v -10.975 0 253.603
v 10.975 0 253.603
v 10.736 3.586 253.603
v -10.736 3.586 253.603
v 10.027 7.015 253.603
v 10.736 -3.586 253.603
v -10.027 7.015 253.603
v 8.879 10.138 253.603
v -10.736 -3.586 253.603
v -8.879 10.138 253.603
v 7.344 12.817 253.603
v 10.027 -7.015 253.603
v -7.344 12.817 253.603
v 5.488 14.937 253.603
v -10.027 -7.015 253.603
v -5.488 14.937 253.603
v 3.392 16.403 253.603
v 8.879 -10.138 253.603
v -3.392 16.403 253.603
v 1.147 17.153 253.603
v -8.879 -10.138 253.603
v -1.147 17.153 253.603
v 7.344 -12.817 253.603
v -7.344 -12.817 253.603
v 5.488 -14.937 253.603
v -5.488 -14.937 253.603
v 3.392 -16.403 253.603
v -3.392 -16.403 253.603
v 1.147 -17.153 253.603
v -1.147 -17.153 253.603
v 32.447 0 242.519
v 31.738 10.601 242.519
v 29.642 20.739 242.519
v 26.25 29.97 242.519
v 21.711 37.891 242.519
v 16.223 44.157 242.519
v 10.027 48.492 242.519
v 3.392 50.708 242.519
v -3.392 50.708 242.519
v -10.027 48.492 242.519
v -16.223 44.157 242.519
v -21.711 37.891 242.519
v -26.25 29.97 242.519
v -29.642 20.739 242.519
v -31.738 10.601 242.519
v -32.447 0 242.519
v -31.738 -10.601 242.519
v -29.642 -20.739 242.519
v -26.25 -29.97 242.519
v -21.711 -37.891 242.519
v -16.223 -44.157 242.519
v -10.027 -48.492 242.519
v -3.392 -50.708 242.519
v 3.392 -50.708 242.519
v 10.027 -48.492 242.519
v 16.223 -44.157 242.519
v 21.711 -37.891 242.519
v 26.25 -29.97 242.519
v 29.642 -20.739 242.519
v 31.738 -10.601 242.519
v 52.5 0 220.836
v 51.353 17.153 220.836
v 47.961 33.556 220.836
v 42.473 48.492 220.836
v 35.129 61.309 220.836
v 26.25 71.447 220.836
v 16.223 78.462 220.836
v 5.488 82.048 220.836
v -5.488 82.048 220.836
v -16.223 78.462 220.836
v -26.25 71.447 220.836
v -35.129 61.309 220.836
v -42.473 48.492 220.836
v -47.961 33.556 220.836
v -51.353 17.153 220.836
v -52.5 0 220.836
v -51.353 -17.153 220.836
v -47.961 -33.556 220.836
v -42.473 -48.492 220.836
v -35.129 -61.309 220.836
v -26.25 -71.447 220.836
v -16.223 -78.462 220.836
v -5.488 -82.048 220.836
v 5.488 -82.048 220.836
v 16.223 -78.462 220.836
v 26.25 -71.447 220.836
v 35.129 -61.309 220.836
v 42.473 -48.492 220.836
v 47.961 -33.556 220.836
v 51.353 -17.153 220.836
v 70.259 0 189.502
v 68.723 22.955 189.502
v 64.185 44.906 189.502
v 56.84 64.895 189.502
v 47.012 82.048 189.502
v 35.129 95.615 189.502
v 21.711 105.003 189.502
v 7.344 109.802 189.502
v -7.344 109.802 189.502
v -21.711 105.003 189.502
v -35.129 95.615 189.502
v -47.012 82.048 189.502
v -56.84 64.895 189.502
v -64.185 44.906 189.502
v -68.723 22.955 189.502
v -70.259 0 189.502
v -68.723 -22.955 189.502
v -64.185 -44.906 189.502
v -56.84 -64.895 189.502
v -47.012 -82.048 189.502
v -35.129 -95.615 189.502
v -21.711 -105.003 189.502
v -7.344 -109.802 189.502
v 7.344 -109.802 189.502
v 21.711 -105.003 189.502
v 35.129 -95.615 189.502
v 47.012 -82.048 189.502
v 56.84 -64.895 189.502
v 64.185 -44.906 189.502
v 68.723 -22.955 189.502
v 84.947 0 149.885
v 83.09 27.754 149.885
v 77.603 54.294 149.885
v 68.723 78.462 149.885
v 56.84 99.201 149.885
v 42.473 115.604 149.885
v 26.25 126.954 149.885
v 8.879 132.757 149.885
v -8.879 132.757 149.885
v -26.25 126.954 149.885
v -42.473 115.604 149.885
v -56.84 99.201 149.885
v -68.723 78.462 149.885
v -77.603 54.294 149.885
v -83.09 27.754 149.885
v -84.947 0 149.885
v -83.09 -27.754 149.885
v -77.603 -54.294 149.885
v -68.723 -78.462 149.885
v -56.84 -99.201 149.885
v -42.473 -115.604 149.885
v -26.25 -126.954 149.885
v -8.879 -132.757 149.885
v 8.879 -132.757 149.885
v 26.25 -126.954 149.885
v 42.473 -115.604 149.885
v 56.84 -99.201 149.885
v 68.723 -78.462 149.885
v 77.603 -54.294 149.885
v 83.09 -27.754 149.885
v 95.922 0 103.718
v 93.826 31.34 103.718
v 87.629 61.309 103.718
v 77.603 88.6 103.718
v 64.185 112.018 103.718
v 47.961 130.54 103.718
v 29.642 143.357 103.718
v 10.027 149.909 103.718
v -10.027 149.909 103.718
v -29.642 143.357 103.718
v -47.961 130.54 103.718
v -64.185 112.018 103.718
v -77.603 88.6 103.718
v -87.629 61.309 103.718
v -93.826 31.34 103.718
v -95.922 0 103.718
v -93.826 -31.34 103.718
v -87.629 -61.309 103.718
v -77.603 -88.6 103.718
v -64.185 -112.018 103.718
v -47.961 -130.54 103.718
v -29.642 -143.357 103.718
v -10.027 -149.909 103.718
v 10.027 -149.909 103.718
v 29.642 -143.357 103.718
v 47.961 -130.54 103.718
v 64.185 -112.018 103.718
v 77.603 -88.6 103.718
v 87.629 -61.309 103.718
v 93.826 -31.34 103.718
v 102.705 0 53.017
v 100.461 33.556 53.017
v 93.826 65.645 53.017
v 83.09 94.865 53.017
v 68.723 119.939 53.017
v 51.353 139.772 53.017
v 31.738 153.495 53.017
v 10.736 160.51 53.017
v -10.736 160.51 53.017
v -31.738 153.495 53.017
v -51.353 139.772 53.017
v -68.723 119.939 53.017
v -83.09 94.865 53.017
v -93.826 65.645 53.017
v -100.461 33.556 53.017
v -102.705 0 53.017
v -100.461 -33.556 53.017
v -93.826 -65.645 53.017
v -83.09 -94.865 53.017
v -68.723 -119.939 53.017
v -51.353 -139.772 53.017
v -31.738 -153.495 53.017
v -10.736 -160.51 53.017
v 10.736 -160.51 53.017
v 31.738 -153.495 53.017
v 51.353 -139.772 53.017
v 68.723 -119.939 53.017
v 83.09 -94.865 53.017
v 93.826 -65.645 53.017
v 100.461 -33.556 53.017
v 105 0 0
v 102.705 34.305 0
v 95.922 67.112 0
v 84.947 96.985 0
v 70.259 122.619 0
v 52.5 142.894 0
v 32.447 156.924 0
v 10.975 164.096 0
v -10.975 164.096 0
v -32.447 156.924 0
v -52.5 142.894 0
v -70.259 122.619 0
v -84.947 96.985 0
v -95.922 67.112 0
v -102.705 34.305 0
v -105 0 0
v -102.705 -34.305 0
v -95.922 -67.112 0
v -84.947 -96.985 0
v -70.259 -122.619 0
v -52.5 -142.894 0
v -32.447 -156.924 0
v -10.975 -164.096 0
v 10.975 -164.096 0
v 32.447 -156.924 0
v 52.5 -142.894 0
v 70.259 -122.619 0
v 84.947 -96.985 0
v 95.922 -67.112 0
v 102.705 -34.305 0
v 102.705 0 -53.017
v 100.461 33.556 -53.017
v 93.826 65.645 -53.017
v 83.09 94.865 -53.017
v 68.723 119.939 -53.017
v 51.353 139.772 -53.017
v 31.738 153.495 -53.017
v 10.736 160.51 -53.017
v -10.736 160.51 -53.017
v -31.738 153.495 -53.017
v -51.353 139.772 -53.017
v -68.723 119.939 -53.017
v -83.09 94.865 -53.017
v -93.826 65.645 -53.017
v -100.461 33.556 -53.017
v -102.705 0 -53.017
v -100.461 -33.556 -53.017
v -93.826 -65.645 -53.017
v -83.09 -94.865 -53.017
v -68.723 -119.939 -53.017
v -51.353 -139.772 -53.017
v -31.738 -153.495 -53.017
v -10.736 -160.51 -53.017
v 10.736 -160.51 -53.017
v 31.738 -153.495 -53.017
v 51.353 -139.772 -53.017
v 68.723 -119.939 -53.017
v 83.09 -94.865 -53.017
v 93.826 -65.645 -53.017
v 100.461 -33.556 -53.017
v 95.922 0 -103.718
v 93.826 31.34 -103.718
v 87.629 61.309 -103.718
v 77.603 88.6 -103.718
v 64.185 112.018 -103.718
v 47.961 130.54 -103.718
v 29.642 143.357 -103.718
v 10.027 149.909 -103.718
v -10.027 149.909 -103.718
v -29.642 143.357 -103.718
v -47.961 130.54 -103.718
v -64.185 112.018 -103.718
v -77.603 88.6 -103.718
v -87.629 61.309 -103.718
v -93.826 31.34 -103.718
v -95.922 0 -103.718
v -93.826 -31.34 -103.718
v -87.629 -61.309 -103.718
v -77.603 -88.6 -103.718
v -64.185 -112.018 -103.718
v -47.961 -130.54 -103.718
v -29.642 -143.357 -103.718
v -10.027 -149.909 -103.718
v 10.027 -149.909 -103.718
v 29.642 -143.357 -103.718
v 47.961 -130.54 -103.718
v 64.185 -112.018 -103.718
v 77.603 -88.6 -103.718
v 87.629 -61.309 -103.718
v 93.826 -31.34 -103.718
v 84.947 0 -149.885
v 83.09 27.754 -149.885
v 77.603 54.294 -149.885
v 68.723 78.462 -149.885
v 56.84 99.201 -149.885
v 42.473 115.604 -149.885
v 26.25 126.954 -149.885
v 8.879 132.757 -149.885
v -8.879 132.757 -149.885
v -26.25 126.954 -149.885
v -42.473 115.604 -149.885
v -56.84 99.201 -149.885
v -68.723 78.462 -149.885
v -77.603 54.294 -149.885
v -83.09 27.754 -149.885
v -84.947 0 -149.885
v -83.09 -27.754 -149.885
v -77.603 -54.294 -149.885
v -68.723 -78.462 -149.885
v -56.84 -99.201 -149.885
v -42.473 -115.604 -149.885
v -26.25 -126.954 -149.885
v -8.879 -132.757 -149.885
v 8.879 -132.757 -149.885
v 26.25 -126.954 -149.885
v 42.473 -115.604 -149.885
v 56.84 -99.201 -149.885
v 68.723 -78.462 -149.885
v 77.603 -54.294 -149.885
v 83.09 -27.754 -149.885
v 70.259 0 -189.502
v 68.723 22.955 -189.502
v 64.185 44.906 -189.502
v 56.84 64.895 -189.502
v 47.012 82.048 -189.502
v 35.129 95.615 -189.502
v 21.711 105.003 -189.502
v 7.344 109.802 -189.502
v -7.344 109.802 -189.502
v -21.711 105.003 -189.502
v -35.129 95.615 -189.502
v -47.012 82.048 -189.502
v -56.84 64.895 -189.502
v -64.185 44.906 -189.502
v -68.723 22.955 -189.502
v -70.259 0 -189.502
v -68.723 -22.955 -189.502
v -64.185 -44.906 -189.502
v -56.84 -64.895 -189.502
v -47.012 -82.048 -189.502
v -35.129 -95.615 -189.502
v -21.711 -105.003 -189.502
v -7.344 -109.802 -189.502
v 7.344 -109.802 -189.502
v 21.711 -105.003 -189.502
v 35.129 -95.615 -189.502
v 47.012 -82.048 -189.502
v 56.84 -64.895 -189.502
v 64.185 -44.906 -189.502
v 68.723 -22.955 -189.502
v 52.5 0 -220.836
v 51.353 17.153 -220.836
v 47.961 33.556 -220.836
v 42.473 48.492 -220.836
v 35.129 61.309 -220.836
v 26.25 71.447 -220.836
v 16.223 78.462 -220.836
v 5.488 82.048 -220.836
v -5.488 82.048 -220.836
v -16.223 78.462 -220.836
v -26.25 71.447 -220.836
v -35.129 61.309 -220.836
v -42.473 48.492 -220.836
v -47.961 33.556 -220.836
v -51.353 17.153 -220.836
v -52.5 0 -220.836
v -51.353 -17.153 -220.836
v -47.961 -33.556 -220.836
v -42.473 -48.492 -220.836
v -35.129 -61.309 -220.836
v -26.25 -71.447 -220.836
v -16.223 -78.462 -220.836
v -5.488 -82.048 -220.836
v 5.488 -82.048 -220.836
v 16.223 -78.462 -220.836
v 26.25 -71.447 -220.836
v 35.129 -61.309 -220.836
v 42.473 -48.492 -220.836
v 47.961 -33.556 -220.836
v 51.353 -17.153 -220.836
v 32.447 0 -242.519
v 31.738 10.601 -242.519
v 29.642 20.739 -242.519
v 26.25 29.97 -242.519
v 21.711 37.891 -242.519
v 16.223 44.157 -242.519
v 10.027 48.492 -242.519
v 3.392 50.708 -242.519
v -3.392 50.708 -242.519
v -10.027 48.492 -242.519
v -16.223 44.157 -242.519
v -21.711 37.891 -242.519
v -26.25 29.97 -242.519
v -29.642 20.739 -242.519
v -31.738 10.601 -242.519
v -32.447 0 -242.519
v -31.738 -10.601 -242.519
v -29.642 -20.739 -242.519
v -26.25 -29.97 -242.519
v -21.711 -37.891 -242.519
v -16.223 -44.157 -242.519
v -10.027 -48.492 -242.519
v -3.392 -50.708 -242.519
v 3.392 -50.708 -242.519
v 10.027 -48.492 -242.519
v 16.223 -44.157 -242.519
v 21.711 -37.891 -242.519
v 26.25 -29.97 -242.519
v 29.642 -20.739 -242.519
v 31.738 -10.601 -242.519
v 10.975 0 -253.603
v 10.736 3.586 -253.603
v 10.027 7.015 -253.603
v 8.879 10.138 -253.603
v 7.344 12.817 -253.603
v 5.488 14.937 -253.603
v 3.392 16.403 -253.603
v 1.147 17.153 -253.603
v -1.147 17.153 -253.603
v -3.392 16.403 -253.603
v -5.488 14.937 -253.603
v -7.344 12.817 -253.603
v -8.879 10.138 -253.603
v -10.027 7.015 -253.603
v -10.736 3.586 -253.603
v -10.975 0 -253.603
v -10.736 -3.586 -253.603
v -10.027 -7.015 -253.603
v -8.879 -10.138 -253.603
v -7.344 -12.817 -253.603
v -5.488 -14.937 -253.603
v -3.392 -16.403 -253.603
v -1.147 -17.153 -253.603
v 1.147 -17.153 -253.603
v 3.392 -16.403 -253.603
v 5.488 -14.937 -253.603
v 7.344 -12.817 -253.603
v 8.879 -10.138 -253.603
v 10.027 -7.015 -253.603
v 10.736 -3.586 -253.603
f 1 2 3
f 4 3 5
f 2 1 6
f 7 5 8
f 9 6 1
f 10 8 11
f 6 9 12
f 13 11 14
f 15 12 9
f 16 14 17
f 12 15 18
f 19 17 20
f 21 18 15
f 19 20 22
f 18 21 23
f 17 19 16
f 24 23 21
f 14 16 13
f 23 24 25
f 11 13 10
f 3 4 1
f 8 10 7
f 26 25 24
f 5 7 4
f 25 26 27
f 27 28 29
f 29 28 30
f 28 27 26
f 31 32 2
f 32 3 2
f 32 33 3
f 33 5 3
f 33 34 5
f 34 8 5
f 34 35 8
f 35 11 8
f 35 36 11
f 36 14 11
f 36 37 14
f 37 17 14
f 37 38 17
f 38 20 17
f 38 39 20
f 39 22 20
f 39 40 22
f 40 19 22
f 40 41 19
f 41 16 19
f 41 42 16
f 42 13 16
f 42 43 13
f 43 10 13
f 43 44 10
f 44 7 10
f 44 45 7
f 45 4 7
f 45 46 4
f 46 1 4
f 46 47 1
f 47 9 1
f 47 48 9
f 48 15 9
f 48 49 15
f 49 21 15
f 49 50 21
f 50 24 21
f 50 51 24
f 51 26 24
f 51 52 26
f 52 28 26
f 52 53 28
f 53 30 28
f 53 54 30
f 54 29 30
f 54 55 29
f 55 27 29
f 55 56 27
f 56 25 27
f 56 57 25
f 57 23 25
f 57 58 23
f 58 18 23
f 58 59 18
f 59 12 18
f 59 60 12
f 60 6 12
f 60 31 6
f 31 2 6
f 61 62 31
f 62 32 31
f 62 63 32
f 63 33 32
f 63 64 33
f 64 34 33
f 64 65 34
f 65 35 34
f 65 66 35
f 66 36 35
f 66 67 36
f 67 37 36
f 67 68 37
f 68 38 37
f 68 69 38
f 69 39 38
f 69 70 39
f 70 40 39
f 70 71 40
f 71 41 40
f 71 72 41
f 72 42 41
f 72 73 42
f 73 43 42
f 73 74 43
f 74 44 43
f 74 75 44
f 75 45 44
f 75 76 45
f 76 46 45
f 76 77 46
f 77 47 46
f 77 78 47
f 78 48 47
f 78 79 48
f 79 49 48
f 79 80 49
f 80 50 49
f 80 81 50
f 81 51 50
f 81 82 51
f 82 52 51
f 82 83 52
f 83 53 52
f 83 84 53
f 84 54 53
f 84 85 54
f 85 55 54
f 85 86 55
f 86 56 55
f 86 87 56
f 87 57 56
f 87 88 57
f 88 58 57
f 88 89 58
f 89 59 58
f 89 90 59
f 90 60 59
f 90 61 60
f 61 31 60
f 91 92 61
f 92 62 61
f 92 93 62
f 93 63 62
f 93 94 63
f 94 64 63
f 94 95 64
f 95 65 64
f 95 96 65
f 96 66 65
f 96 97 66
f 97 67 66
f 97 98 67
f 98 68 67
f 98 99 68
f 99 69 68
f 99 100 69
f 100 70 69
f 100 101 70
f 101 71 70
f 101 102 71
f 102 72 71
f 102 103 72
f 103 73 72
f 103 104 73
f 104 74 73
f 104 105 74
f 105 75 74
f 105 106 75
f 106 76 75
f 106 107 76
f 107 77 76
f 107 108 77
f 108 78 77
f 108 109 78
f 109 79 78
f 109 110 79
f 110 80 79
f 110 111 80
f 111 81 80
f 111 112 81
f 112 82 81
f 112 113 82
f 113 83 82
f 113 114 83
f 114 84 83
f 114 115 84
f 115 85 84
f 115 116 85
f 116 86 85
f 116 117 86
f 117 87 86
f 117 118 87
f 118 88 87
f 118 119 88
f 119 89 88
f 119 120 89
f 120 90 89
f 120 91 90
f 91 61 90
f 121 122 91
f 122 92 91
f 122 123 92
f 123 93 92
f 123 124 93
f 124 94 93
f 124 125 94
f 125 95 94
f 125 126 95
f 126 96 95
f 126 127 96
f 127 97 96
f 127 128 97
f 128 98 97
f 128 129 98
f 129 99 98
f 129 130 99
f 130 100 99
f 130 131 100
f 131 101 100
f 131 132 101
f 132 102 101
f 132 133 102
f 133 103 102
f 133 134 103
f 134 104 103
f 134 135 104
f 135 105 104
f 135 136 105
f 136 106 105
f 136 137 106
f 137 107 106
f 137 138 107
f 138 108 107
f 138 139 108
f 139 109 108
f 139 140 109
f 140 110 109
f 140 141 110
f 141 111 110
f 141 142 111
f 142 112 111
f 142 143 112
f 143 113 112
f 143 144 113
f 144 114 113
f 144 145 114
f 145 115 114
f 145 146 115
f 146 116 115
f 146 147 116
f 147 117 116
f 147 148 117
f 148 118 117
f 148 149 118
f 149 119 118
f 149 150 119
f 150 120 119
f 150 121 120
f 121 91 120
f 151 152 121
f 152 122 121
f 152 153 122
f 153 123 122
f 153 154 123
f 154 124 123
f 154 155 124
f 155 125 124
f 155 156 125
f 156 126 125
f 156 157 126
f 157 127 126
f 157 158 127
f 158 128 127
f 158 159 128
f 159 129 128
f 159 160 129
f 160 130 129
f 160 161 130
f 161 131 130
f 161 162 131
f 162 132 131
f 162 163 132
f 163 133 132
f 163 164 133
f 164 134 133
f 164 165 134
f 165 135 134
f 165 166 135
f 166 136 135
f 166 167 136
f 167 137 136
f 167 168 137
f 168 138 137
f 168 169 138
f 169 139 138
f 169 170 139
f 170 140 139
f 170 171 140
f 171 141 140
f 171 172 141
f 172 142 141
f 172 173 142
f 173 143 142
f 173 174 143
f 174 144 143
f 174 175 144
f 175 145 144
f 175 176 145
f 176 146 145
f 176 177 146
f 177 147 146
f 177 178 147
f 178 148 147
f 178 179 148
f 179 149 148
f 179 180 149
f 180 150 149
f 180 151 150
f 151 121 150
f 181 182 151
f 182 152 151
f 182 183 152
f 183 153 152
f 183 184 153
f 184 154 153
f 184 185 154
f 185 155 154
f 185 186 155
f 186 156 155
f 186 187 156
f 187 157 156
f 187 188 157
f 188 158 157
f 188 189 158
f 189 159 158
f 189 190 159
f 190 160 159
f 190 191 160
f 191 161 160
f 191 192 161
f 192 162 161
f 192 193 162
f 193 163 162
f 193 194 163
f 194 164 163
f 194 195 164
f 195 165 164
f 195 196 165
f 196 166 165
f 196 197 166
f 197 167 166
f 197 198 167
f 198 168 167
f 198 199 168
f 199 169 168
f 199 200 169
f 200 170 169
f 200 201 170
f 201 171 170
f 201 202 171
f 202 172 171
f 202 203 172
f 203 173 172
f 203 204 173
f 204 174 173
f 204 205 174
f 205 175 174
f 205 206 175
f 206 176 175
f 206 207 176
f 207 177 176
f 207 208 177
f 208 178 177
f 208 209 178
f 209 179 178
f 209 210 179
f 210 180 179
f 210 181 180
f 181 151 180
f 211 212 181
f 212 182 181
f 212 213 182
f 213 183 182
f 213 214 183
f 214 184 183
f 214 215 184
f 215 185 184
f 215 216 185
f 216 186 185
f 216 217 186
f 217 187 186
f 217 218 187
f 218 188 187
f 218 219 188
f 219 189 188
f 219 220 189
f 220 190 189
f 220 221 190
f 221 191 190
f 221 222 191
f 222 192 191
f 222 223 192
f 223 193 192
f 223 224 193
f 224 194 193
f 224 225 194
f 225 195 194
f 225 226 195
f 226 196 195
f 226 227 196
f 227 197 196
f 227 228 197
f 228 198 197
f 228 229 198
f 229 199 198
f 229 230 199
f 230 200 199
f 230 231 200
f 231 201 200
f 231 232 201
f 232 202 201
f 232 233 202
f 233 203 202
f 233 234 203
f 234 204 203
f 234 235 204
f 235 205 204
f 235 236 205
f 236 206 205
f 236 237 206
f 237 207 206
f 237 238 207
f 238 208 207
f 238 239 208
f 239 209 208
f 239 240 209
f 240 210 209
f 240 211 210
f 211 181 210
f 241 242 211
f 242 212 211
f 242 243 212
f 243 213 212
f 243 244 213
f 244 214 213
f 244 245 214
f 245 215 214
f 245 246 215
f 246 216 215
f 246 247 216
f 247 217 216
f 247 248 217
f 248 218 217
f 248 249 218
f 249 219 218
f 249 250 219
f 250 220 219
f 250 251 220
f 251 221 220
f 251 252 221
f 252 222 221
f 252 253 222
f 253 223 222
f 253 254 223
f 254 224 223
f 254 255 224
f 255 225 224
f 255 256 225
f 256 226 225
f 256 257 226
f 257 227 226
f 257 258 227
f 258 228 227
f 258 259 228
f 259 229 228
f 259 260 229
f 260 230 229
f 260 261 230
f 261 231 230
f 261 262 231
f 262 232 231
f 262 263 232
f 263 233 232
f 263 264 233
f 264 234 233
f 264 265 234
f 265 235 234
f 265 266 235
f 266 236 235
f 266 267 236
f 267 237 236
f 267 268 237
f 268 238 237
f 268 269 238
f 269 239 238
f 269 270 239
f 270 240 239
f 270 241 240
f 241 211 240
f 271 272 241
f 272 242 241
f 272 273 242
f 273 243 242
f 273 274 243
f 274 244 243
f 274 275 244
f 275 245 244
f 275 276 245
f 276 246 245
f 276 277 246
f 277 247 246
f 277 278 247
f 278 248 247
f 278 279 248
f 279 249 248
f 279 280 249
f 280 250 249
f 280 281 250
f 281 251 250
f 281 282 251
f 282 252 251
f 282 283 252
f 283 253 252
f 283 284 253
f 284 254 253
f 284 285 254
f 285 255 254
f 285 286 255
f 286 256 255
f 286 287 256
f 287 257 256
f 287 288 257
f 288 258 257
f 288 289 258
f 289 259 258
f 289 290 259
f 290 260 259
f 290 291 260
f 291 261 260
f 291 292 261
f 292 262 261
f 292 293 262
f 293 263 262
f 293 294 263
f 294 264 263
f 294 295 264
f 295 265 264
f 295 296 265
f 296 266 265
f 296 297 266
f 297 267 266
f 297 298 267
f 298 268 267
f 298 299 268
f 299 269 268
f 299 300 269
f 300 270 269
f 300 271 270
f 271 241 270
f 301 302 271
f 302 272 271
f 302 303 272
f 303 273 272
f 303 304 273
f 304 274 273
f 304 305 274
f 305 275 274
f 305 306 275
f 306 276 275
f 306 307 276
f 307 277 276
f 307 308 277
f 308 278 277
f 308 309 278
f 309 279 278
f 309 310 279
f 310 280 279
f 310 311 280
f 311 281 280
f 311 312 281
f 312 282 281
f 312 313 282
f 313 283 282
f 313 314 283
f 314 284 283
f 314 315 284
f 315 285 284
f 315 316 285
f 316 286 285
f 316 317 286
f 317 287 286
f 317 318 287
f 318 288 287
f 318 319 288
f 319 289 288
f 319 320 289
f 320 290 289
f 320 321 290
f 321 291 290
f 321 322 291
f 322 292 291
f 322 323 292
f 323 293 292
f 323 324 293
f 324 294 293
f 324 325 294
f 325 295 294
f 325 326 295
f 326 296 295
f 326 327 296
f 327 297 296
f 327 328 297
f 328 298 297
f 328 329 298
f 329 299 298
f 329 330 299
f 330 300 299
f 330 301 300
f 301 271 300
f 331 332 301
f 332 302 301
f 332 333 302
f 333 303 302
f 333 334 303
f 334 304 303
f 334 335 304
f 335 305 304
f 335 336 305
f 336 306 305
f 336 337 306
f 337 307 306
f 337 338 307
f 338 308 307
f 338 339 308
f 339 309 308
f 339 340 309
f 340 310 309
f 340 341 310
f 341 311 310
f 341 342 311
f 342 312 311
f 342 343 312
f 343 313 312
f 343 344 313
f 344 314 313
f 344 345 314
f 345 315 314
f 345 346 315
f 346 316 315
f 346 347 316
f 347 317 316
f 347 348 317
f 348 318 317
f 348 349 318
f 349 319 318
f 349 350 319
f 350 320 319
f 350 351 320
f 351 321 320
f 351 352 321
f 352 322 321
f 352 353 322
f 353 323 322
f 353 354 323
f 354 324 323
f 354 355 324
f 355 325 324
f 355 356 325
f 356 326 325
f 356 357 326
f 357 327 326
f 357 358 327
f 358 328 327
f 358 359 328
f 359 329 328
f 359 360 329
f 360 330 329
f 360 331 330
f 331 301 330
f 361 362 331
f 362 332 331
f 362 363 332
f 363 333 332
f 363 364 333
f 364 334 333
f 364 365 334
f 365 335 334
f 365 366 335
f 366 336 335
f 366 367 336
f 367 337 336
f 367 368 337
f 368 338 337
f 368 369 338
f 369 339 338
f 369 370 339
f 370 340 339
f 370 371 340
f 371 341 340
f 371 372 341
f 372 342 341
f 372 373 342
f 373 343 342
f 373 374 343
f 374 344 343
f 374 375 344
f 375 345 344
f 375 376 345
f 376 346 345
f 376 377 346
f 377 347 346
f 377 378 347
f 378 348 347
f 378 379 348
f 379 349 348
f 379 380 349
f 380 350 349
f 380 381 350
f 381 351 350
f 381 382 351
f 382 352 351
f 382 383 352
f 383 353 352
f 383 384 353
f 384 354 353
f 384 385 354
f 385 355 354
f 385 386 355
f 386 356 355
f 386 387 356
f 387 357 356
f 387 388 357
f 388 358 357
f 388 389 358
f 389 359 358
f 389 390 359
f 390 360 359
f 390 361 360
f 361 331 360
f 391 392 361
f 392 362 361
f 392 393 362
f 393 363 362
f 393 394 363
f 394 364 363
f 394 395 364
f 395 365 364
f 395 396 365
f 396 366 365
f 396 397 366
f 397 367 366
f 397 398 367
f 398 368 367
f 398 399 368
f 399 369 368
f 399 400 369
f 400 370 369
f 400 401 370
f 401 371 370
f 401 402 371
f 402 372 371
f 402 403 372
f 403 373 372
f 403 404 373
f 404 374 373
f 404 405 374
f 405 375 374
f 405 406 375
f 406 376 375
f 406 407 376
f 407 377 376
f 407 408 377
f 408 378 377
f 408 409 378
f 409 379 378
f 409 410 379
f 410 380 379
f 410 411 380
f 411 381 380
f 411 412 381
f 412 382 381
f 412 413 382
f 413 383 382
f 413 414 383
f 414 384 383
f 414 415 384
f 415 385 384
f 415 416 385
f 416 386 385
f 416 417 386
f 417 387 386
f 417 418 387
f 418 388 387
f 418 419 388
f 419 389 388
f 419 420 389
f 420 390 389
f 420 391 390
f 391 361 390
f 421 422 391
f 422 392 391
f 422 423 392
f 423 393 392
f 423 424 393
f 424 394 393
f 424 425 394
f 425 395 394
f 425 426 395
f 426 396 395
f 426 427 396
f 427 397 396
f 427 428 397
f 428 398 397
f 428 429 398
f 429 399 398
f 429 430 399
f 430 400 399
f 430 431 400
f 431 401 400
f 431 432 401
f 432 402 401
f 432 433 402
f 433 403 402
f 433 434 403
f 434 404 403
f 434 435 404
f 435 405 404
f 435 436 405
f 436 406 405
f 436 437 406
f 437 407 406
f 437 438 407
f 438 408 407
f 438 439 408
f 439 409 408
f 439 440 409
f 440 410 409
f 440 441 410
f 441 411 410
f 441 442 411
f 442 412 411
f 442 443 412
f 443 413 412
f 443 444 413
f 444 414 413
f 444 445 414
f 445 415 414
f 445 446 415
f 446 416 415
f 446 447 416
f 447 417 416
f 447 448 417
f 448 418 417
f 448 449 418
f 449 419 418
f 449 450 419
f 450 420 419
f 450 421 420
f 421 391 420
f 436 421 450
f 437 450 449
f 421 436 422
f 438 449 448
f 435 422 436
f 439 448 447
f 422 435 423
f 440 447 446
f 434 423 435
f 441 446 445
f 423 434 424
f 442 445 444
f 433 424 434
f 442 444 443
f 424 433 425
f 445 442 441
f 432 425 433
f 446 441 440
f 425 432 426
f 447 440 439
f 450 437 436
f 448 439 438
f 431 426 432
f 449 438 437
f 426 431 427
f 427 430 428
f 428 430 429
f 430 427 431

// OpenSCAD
// Generated by SolidPython 1.0.1 on 2020-07-29 00:46:47


scale(v = [7, 11, 17]) {
	sphere(r = 15);
}
/***********************************************
*********      SolidPython code:      **********
************************************************
 
# import packages: SolidPython
from solid import *
from solid.utils import *
from itertools import chain, combinations, permutations


class Resize:

    def __init__(self, scad_file):
        self.scad_file = scad_file
        #self.scad_file = import_scad(scad_file)
        # cone/cylinder param:
        self.r1 = 0
        self.r2 = 0
        self.h = 0
        # rectangular prism param:
        self.w = 0
        self.l = 0
        # ellipse param:
        self.r = 0

    # import OpenScad code (file name corresponds to shape)


    # classify shape + parameters
    def assign(self, param1, param2, param3):
        if self.scad_file == 'cone.scad':
            self.r1 = param1
            self.r2 = param2
            self.h = param3
        elif self.scad_file == 'cylinder.scad':
            self.r1 = param1
            self.r2 = param2
            self.h = param3
        elif self.scad_file == 'rectangularPrism.scad':
            self.h = param1
            self.l = param2
            self.w = param3
        else:
            self.r = param1
            self.h = param2

    # resize parameters
    def iterate(self):
        x = range(3, 20, 2)
        i = 1
        if self.scad_file == 'cone.scad':
            tempList = list(permutations(x, 2))
            for temp in tempList:
                param1 = temp[0]
                param2 = temp[1]
                filepath = 'produced_scad_files/' + 'cone' + str(param1) + '_' + str(param2) + '_' + '.scad'
                scad_render_to_file(cylinder(h=param1, r1=param2, r2=0), filepath)

        elif self.scad_file == 'cylinder.scad':
            tempList = list(permutations(x, 3))
            for temp in tempList:
                param1 = temp[0]
                param2 = temp[1]
                filepath = 'produced_scad_files/' + 'cylinder' + str(param1) + '_' + str(param2) + '_' + '.scad'
                scad_render_to_file(cylinder(h=param1, r1=param2, r2=param2), filepath)

        elif self.scad_file == 'rectangularPrism.scad':
            tempList = list(permutations(x, 3))
            for temp in tempList:
                param1 = temp[0]
                param2 = temp[1]
                param3 = temp[2]
                filepath = 'produced_scad_files/' + 'rectangularPrism' + str(param1) + '_' + str(param2) + '_' + str(
                    param3) + '.scad'
                scad_render_to_file(cube(size=(param1, param2, param3)), filepath)

        elif self.scad_file == 'ellipse.scad':
            tempList = list(permutations(x, 4))
            for temp in tempList:
                param1 = temp[0]
                param2 = temp[1]
                param3 = temp[2]
                param4 = temp[3]
                filepath = 'produced_scad_files/' + 'ellipse' + str(param1) + '_' + str(param2) + '_' + str(param3) + '_' + str(param4) + '.scad'
                scad_render_to_file(scale([param1, param2, param3])(sphere(r=param4)), filepath)

    def render_to_scadfile(self):
        scad_render_to_file(scad, 'example.scad') 
 
************************************************/
